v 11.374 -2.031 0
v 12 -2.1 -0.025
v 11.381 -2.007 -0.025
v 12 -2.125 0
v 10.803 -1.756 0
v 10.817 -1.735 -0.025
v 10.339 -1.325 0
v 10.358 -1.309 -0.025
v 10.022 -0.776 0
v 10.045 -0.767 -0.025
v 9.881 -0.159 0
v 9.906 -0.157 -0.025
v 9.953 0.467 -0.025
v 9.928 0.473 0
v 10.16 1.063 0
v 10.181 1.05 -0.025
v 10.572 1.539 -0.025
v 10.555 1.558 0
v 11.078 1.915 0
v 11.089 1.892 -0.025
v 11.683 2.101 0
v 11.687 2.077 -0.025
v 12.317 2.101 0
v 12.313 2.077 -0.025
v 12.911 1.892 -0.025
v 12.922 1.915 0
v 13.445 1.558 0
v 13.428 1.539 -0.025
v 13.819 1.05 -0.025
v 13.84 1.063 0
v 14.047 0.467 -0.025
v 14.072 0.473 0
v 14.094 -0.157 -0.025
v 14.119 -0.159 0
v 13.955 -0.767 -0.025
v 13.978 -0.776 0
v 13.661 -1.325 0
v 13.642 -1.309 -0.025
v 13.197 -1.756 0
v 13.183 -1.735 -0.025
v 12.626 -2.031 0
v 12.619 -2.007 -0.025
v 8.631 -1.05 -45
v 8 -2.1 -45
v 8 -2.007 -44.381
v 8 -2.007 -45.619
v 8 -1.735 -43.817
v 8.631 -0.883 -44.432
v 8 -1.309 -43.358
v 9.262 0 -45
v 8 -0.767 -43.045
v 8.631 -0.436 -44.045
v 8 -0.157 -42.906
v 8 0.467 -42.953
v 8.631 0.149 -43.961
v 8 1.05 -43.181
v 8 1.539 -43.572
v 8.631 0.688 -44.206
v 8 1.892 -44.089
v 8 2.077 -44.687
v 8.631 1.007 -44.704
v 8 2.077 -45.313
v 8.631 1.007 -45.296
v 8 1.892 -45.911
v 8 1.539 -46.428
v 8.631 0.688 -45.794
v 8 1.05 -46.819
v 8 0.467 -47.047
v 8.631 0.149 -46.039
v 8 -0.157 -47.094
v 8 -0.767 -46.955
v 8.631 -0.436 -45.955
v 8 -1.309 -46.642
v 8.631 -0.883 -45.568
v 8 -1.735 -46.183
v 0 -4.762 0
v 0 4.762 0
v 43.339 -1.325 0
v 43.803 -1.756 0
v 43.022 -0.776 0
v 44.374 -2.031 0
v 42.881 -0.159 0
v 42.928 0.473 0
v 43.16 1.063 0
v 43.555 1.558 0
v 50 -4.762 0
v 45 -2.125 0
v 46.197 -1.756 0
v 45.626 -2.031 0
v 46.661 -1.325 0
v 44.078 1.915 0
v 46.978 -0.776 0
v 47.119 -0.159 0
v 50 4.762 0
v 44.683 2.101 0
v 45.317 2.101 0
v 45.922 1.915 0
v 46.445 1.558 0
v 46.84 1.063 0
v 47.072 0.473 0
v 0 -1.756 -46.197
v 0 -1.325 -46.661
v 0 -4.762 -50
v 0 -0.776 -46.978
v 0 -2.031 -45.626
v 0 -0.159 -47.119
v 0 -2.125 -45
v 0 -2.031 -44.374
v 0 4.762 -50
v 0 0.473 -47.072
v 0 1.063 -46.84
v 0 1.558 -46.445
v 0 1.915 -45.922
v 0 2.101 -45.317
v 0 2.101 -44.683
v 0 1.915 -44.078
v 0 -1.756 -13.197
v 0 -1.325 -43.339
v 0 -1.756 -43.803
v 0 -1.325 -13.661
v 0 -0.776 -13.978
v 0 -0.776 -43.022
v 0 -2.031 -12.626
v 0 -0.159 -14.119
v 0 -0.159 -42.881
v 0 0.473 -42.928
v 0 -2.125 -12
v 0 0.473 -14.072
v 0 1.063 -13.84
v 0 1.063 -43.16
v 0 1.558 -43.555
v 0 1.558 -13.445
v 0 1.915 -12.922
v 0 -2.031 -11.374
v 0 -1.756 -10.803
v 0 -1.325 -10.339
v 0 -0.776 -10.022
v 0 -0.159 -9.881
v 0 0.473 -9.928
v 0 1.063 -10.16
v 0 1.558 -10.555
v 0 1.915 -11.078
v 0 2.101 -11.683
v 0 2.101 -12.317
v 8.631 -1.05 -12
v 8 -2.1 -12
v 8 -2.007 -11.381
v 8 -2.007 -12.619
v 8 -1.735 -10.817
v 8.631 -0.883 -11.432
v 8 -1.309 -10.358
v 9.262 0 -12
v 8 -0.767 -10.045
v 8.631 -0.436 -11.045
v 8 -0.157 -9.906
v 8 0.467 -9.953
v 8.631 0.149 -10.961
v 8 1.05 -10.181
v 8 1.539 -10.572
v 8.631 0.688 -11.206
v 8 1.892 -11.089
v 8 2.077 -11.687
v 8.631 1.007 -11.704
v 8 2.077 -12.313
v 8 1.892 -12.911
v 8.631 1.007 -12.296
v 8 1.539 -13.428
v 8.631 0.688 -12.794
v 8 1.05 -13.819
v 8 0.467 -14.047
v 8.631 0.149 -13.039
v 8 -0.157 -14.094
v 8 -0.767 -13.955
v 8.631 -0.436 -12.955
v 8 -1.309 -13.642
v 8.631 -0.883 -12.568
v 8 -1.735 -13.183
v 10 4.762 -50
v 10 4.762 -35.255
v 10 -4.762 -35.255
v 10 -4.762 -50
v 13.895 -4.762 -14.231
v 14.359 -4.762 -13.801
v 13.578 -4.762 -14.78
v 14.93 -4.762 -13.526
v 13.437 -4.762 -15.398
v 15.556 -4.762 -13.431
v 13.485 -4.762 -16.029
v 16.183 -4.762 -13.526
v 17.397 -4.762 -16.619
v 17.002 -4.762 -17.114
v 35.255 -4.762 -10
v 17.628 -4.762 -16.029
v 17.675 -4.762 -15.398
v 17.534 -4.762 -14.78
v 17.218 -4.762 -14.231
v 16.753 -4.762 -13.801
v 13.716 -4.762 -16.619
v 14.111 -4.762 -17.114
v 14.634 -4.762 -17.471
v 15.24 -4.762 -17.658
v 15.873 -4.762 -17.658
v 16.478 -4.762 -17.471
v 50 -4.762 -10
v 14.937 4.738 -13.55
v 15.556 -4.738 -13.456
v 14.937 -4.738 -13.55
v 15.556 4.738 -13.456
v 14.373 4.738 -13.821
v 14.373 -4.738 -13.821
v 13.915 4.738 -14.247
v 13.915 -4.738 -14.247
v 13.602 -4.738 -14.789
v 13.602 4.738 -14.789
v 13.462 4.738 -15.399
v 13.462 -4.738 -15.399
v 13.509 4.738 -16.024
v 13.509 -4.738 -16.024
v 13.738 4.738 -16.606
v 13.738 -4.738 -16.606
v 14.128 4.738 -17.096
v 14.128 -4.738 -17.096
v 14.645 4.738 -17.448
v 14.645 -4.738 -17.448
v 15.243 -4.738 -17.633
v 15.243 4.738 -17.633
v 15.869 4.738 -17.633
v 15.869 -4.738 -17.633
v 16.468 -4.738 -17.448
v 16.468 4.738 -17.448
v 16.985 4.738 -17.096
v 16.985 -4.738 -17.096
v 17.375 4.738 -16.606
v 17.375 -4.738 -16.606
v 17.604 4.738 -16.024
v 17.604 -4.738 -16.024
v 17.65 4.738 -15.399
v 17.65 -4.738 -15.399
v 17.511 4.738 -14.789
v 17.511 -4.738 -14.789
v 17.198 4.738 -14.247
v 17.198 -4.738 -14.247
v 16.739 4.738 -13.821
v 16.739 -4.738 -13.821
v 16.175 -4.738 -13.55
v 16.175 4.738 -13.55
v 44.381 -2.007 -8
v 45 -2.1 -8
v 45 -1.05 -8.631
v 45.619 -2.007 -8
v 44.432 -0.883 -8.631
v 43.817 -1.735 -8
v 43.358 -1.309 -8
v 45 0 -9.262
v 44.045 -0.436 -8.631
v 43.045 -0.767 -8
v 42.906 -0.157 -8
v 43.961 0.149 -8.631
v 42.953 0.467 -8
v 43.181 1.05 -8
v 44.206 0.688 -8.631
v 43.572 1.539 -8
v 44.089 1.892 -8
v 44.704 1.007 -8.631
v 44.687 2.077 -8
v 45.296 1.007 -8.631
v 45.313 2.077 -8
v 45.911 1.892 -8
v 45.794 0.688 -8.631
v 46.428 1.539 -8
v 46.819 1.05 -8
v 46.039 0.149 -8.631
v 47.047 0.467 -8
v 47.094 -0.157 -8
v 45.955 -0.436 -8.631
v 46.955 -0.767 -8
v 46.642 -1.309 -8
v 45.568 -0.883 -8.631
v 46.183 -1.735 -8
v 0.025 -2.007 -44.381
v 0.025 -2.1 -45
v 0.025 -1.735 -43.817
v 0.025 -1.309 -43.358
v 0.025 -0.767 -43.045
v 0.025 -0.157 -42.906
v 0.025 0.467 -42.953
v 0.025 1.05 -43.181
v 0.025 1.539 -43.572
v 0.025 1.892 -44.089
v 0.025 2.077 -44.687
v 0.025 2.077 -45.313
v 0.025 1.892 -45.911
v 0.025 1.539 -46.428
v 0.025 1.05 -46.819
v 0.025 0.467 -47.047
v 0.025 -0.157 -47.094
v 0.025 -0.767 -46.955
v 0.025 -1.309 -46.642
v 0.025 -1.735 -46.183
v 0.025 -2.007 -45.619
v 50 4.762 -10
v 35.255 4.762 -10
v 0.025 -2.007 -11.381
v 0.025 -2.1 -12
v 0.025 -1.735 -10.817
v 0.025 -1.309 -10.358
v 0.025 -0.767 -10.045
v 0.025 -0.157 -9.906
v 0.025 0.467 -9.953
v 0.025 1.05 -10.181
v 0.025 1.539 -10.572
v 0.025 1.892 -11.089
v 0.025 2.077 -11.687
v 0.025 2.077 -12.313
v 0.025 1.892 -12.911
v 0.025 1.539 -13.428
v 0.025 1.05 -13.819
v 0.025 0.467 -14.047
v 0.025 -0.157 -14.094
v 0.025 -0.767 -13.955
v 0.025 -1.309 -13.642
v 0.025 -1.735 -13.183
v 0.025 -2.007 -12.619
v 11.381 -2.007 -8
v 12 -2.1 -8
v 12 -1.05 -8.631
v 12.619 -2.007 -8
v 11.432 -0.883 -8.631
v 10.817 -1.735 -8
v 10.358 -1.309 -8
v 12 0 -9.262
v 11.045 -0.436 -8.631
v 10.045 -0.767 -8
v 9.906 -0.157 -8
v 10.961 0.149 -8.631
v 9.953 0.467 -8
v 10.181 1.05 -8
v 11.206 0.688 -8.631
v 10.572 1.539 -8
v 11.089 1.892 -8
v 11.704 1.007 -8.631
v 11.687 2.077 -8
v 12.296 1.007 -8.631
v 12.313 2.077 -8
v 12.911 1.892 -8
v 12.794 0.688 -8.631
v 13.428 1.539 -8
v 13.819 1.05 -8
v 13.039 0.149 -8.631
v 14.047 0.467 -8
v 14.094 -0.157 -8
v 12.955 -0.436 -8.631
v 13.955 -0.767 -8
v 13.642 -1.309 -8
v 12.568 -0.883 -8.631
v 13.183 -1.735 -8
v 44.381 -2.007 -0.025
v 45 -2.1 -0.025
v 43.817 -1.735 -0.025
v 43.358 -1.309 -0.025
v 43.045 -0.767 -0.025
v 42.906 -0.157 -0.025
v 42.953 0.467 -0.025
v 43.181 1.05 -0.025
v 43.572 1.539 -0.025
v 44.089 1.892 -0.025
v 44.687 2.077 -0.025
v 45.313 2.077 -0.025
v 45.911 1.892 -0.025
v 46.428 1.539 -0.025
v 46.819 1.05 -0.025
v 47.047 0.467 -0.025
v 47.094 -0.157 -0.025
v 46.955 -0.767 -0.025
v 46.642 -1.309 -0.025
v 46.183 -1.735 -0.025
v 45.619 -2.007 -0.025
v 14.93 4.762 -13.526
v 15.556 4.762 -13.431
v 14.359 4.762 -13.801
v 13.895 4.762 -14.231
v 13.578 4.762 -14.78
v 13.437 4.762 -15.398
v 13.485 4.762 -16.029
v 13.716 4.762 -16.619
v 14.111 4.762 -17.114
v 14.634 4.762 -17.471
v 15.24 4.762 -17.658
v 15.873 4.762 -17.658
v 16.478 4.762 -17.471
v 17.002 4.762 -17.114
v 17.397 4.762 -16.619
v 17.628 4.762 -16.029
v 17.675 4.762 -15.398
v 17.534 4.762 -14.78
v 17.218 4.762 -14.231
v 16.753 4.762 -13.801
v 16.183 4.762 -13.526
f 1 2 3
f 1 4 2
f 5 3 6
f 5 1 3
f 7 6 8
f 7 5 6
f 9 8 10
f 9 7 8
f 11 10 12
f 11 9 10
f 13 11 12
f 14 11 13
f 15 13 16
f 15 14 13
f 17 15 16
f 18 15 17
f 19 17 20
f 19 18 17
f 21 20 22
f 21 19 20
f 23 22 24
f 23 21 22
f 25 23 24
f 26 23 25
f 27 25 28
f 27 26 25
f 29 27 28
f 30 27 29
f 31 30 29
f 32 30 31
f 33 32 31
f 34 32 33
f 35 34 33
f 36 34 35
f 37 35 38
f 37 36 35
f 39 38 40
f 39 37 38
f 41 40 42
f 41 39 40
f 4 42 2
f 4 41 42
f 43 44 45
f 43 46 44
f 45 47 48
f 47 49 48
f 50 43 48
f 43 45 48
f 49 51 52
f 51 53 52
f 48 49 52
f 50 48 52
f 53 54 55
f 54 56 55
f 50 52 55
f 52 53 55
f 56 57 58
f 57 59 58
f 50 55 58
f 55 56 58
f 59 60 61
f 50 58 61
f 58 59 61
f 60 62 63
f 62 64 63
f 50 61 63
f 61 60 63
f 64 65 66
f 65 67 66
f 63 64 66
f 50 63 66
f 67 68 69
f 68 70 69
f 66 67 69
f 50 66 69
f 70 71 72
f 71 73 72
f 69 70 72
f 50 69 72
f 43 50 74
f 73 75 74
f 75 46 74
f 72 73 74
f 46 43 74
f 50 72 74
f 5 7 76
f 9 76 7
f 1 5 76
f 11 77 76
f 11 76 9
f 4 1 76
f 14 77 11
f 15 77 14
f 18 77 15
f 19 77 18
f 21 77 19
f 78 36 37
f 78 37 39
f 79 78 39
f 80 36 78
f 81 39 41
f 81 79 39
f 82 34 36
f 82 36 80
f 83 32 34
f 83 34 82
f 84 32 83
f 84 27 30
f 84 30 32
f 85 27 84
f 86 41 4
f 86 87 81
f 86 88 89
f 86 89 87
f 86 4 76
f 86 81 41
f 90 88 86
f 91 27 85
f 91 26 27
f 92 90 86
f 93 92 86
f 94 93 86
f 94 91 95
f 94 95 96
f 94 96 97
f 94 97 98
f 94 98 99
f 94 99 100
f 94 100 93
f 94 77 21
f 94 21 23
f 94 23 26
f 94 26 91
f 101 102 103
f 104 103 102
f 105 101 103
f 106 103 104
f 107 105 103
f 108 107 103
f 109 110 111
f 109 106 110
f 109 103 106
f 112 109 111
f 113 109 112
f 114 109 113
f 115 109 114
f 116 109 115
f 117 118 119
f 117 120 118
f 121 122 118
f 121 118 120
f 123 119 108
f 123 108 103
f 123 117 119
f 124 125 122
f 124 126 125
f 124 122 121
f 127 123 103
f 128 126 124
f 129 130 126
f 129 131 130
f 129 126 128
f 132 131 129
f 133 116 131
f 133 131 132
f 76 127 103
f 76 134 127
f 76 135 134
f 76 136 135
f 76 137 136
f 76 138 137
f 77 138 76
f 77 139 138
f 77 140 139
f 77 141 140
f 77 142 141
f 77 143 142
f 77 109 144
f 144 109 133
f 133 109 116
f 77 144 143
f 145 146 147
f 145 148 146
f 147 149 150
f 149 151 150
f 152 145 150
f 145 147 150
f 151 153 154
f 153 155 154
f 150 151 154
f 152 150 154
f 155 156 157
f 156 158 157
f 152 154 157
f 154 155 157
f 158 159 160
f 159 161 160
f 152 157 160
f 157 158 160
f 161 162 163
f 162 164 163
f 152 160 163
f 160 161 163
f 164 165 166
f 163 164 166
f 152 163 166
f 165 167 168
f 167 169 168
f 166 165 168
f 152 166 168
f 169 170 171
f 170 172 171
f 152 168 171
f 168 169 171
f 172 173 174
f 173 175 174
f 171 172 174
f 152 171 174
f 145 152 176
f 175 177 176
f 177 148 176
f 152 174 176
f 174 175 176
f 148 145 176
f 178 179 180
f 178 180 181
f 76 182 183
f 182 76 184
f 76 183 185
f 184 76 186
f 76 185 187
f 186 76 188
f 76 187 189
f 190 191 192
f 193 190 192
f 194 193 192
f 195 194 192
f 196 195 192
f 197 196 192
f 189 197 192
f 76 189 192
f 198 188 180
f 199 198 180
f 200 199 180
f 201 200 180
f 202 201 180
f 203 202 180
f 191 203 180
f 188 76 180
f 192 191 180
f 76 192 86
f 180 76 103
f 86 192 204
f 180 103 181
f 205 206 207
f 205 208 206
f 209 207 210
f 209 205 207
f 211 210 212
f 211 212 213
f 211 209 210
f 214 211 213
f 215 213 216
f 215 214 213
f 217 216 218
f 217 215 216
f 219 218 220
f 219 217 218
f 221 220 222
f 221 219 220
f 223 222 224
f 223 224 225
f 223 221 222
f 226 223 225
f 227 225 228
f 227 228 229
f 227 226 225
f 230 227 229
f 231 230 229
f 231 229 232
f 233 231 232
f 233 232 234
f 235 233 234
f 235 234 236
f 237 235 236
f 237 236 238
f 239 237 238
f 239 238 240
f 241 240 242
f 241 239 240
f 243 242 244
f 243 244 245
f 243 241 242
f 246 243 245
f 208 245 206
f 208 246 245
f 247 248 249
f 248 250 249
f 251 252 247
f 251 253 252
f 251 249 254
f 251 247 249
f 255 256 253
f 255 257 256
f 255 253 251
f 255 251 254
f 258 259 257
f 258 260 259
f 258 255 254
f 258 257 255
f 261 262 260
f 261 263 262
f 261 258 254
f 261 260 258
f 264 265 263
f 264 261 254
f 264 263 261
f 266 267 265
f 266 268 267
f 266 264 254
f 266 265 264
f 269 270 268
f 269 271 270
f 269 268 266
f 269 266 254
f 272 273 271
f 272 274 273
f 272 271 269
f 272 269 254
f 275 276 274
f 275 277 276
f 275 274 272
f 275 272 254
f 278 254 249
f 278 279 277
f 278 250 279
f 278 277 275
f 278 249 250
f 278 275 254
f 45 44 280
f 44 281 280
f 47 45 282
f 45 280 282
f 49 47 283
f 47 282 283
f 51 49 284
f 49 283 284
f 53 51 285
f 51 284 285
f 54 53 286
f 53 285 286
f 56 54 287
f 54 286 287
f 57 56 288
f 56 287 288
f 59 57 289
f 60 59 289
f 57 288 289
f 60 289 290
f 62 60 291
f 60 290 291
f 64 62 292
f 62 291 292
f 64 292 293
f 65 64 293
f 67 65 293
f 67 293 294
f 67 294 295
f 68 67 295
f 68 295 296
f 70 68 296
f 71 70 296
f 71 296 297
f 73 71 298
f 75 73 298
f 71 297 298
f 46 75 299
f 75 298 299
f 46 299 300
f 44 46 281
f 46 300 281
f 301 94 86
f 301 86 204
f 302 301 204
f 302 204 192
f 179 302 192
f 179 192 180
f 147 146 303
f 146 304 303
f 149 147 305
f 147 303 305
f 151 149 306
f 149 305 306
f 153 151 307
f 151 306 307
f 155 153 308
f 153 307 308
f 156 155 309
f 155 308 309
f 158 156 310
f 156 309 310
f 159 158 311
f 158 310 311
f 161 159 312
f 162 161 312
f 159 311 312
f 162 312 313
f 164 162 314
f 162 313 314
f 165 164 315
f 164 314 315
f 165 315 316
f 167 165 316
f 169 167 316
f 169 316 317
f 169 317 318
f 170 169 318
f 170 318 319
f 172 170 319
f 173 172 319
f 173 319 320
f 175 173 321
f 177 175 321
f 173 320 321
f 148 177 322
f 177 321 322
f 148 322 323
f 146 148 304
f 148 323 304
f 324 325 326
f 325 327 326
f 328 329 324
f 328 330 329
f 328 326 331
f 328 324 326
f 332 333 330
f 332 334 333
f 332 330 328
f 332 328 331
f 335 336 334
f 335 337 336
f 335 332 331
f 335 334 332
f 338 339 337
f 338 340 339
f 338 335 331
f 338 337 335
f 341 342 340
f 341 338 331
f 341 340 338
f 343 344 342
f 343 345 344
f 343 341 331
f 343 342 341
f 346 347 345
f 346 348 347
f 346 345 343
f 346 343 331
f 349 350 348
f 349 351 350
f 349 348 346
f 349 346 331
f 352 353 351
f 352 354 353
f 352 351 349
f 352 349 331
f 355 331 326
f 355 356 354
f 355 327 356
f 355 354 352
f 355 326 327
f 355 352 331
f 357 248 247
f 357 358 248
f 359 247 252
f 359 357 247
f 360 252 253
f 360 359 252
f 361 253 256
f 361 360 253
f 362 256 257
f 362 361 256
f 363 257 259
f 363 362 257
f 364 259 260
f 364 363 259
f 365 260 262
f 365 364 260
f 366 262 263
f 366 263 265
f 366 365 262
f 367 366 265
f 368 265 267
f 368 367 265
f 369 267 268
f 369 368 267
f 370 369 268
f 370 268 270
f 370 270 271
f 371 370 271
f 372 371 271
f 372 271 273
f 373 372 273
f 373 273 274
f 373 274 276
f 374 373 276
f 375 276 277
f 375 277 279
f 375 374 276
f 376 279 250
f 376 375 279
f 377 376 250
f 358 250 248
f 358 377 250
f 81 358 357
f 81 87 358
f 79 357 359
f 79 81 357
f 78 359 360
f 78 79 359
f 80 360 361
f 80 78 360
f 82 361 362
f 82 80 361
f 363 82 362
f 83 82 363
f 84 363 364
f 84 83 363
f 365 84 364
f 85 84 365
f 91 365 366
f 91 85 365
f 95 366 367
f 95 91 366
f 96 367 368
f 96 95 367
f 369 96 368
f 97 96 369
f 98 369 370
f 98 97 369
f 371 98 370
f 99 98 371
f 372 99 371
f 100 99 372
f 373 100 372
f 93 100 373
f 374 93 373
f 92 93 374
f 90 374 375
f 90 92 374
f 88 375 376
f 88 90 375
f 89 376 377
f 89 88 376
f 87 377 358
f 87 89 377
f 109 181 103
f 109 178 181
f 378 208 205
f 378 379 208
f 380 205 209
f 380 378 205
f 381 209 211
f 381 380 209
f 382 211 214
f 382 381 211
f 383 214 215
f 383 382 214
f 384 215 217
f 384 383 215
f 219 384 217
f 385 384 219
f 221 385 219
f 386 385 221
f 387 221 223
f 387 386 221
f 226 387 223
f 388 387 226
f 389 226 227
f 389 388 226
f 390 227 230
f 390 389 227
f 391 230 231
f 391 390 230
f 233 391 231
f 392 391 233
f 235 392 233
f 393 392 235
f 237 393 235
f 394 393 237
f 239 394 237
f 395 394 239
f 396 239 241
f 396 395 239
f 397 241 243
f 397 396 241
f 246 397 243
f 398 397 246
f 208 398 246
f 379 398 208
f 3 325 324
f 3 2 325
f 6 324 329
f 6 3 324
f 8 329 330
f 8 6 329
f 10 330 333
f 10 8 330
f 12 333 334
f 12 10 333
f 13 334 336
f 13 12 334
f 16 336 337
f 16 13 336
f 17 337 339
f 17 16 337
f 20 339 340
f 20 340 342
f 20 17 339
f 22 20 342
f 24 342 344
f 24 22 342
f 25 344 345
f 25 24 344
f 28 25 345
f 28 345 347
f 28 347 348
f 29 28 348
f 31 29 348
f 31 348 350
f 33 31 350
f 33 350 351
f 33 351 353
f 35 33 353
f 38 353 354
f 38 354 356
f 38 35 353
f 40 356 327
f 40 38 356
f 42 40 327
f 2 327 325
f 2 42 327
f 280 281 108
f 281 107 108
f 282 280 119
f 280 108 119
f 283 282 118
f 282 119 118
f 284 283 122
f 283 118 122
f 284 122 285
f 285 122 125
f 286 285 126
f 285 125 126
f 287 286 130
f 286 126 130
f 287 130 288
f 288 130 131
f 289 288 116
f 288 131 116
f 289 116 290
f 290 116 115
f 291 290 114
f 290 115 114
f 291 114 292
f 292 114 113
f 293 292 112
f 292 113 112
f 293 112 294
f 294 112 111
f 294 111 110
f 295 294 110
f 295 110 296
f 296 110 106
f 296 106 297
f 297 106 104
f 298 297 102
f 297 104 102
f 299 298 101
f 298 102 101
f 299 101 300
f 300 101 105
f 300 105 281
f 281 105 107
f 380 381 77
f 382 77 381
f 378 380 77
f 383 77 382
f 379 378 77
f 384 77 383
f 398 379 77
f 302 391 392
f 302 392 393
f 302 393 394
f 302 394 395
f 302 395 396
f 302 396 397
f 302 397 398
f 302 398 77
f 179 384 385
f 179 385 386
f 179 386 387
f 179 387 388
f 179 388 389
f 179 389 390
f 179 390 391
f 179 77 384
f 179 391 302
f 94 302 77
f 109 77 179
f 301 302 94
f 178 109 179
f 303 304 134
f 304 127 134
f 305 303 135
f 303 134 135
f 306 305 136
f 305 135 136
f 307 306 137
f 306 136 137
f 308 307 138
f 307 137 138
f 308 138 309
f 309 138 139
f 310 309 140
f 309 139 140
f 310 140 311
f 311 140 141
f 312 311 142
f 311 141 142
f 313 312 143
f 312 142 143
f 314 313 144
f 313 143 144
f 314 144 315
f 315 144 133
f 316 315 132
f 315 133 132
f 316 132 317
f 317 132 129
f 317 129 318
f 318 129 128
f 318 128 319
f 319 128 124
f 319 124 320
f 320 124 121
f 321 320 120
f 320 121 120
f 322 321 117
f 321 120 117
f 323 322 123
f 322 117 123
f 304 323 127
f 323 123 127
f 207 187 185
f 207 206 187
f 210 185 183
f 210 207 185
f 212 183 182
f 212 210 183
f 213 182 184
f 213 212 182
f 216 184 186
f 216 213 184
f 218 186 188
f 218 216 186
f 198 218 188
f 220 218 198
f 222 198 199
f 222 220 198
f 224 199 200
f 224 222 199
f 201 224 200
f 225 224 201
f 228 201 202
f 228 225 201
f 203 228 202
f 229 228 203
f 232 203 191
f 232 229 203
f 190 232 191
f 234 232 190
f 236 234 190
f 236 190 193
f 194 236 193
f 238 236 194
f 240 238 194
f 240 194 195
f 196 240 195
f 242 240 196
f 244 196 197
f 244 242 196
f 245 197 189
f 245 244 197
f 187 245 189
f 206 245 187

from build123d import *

# Parameters (mm, degrees)
BOSS_EXTRUDE1_DEPTH                  = 4.7625
TAP_DRILL_FOR_M5X0_8_TAP1_AT_2_COUNT = 2
TAP_DRILL_FOR_M5X0_8_TAP1_AT_2_PITCH = 33


with BuildPart() as part:
    # Sketch1 → Boss-Extrude1 (new, symmetric)
    with BuildSketch(Plane(origin=(0, 0, 0), x_dir=(1, 0, 0), z_dir=(0, 1, 0))):
        Polygon((0, 0), (50, 0), (50, 10), (35.254833996, 10), (10, 35.254833996), (10, 50), (0, 50), align=None)
    extrude(amount=BOSS_EXTRUDE1_DEPTH, both=True)

    # Sketch6 → Tap Drill for M5x0.8 Tap1 (revolve, cut)
    with BuildSketch(Plane(origin=(12, 0, 0), x_dir=(0, -1, 0), z_dir=(1, 0, 0))):
        Polygon((0, 0), (0, 9.2618073), (2.1, 8), (2.1, 0.025), (2.125, 0), align=None)
    tap_drill_for_m5x0_8_tap1 = revolve(axis=Axis((12, 0, 6.35), (0, 0, -1)), mode=Mode.SUBTRACT)

    # Tap Drill for M5x0.8 Tap1 at 2: Tap Drill for M5x0.8 Tap1 ×2
    with Locations(*[(i * TAP_DRILL_FOR_M5X0_8_TAP1_AT_2_PITCH, 0, 0) for i in range(1, TAP_DRILL_FOR_M5X0_8_TAP1_AT_2_COUNT)]):
        add(tap_drill_for_m5x0_8_tap1, mode=Mode.SUBTRACT)

    # Mirror1: Tap Drill for M5x0.8 Tap1 across plane
    add(tap_drill_for_m5x0_8_tap1.mirror(Plane(origin=(0, 0, 0), x_dir=(-0.7071067811865478, 0, 0.7071067811865472), z_dir=(0.7071067811865475, 0, 0.7071067811865477))), mode=Mode.SUBTRACT)

    # Mirror1 copy 1 sketch → Mirror1 copy 1 (revolve, cut)
    with BuildSketch(Plane(origin=(0, 0, -45), x_dir=(0, -1, 0), z_dir=(0, 0, -1))):
        Polygon((0, 0), (0, -9.2618073), (2.1, -8), (2.1, -0.025), (2.125, 0), align=None)
    revolve(axis=Axis((-6.35, 0, -45), (-1, 0, 0)), mode=Mode.SUBTRACT)

    # Sketch10 → Tap Drill for M5x0.8 Tap2 (revolve, cut)
    with BuildSketch(Plane(origin=(15.556349186, 4.7625, -15.556349186), x_dir=(0, 0, 1), z_dir=(1, 0, 0))):
        Polygon((0, 0), (0, 9.525), (2.125, 9.525), (2.1, 9.5), (2.1, 0.025), (2.125, 0), align=None)
    revolve(axis=Axis((15.556349186, 11.1125, -15.556349186), (0, -1, 0)), mode=Mode.SUBTRACT)


solid = part.part
